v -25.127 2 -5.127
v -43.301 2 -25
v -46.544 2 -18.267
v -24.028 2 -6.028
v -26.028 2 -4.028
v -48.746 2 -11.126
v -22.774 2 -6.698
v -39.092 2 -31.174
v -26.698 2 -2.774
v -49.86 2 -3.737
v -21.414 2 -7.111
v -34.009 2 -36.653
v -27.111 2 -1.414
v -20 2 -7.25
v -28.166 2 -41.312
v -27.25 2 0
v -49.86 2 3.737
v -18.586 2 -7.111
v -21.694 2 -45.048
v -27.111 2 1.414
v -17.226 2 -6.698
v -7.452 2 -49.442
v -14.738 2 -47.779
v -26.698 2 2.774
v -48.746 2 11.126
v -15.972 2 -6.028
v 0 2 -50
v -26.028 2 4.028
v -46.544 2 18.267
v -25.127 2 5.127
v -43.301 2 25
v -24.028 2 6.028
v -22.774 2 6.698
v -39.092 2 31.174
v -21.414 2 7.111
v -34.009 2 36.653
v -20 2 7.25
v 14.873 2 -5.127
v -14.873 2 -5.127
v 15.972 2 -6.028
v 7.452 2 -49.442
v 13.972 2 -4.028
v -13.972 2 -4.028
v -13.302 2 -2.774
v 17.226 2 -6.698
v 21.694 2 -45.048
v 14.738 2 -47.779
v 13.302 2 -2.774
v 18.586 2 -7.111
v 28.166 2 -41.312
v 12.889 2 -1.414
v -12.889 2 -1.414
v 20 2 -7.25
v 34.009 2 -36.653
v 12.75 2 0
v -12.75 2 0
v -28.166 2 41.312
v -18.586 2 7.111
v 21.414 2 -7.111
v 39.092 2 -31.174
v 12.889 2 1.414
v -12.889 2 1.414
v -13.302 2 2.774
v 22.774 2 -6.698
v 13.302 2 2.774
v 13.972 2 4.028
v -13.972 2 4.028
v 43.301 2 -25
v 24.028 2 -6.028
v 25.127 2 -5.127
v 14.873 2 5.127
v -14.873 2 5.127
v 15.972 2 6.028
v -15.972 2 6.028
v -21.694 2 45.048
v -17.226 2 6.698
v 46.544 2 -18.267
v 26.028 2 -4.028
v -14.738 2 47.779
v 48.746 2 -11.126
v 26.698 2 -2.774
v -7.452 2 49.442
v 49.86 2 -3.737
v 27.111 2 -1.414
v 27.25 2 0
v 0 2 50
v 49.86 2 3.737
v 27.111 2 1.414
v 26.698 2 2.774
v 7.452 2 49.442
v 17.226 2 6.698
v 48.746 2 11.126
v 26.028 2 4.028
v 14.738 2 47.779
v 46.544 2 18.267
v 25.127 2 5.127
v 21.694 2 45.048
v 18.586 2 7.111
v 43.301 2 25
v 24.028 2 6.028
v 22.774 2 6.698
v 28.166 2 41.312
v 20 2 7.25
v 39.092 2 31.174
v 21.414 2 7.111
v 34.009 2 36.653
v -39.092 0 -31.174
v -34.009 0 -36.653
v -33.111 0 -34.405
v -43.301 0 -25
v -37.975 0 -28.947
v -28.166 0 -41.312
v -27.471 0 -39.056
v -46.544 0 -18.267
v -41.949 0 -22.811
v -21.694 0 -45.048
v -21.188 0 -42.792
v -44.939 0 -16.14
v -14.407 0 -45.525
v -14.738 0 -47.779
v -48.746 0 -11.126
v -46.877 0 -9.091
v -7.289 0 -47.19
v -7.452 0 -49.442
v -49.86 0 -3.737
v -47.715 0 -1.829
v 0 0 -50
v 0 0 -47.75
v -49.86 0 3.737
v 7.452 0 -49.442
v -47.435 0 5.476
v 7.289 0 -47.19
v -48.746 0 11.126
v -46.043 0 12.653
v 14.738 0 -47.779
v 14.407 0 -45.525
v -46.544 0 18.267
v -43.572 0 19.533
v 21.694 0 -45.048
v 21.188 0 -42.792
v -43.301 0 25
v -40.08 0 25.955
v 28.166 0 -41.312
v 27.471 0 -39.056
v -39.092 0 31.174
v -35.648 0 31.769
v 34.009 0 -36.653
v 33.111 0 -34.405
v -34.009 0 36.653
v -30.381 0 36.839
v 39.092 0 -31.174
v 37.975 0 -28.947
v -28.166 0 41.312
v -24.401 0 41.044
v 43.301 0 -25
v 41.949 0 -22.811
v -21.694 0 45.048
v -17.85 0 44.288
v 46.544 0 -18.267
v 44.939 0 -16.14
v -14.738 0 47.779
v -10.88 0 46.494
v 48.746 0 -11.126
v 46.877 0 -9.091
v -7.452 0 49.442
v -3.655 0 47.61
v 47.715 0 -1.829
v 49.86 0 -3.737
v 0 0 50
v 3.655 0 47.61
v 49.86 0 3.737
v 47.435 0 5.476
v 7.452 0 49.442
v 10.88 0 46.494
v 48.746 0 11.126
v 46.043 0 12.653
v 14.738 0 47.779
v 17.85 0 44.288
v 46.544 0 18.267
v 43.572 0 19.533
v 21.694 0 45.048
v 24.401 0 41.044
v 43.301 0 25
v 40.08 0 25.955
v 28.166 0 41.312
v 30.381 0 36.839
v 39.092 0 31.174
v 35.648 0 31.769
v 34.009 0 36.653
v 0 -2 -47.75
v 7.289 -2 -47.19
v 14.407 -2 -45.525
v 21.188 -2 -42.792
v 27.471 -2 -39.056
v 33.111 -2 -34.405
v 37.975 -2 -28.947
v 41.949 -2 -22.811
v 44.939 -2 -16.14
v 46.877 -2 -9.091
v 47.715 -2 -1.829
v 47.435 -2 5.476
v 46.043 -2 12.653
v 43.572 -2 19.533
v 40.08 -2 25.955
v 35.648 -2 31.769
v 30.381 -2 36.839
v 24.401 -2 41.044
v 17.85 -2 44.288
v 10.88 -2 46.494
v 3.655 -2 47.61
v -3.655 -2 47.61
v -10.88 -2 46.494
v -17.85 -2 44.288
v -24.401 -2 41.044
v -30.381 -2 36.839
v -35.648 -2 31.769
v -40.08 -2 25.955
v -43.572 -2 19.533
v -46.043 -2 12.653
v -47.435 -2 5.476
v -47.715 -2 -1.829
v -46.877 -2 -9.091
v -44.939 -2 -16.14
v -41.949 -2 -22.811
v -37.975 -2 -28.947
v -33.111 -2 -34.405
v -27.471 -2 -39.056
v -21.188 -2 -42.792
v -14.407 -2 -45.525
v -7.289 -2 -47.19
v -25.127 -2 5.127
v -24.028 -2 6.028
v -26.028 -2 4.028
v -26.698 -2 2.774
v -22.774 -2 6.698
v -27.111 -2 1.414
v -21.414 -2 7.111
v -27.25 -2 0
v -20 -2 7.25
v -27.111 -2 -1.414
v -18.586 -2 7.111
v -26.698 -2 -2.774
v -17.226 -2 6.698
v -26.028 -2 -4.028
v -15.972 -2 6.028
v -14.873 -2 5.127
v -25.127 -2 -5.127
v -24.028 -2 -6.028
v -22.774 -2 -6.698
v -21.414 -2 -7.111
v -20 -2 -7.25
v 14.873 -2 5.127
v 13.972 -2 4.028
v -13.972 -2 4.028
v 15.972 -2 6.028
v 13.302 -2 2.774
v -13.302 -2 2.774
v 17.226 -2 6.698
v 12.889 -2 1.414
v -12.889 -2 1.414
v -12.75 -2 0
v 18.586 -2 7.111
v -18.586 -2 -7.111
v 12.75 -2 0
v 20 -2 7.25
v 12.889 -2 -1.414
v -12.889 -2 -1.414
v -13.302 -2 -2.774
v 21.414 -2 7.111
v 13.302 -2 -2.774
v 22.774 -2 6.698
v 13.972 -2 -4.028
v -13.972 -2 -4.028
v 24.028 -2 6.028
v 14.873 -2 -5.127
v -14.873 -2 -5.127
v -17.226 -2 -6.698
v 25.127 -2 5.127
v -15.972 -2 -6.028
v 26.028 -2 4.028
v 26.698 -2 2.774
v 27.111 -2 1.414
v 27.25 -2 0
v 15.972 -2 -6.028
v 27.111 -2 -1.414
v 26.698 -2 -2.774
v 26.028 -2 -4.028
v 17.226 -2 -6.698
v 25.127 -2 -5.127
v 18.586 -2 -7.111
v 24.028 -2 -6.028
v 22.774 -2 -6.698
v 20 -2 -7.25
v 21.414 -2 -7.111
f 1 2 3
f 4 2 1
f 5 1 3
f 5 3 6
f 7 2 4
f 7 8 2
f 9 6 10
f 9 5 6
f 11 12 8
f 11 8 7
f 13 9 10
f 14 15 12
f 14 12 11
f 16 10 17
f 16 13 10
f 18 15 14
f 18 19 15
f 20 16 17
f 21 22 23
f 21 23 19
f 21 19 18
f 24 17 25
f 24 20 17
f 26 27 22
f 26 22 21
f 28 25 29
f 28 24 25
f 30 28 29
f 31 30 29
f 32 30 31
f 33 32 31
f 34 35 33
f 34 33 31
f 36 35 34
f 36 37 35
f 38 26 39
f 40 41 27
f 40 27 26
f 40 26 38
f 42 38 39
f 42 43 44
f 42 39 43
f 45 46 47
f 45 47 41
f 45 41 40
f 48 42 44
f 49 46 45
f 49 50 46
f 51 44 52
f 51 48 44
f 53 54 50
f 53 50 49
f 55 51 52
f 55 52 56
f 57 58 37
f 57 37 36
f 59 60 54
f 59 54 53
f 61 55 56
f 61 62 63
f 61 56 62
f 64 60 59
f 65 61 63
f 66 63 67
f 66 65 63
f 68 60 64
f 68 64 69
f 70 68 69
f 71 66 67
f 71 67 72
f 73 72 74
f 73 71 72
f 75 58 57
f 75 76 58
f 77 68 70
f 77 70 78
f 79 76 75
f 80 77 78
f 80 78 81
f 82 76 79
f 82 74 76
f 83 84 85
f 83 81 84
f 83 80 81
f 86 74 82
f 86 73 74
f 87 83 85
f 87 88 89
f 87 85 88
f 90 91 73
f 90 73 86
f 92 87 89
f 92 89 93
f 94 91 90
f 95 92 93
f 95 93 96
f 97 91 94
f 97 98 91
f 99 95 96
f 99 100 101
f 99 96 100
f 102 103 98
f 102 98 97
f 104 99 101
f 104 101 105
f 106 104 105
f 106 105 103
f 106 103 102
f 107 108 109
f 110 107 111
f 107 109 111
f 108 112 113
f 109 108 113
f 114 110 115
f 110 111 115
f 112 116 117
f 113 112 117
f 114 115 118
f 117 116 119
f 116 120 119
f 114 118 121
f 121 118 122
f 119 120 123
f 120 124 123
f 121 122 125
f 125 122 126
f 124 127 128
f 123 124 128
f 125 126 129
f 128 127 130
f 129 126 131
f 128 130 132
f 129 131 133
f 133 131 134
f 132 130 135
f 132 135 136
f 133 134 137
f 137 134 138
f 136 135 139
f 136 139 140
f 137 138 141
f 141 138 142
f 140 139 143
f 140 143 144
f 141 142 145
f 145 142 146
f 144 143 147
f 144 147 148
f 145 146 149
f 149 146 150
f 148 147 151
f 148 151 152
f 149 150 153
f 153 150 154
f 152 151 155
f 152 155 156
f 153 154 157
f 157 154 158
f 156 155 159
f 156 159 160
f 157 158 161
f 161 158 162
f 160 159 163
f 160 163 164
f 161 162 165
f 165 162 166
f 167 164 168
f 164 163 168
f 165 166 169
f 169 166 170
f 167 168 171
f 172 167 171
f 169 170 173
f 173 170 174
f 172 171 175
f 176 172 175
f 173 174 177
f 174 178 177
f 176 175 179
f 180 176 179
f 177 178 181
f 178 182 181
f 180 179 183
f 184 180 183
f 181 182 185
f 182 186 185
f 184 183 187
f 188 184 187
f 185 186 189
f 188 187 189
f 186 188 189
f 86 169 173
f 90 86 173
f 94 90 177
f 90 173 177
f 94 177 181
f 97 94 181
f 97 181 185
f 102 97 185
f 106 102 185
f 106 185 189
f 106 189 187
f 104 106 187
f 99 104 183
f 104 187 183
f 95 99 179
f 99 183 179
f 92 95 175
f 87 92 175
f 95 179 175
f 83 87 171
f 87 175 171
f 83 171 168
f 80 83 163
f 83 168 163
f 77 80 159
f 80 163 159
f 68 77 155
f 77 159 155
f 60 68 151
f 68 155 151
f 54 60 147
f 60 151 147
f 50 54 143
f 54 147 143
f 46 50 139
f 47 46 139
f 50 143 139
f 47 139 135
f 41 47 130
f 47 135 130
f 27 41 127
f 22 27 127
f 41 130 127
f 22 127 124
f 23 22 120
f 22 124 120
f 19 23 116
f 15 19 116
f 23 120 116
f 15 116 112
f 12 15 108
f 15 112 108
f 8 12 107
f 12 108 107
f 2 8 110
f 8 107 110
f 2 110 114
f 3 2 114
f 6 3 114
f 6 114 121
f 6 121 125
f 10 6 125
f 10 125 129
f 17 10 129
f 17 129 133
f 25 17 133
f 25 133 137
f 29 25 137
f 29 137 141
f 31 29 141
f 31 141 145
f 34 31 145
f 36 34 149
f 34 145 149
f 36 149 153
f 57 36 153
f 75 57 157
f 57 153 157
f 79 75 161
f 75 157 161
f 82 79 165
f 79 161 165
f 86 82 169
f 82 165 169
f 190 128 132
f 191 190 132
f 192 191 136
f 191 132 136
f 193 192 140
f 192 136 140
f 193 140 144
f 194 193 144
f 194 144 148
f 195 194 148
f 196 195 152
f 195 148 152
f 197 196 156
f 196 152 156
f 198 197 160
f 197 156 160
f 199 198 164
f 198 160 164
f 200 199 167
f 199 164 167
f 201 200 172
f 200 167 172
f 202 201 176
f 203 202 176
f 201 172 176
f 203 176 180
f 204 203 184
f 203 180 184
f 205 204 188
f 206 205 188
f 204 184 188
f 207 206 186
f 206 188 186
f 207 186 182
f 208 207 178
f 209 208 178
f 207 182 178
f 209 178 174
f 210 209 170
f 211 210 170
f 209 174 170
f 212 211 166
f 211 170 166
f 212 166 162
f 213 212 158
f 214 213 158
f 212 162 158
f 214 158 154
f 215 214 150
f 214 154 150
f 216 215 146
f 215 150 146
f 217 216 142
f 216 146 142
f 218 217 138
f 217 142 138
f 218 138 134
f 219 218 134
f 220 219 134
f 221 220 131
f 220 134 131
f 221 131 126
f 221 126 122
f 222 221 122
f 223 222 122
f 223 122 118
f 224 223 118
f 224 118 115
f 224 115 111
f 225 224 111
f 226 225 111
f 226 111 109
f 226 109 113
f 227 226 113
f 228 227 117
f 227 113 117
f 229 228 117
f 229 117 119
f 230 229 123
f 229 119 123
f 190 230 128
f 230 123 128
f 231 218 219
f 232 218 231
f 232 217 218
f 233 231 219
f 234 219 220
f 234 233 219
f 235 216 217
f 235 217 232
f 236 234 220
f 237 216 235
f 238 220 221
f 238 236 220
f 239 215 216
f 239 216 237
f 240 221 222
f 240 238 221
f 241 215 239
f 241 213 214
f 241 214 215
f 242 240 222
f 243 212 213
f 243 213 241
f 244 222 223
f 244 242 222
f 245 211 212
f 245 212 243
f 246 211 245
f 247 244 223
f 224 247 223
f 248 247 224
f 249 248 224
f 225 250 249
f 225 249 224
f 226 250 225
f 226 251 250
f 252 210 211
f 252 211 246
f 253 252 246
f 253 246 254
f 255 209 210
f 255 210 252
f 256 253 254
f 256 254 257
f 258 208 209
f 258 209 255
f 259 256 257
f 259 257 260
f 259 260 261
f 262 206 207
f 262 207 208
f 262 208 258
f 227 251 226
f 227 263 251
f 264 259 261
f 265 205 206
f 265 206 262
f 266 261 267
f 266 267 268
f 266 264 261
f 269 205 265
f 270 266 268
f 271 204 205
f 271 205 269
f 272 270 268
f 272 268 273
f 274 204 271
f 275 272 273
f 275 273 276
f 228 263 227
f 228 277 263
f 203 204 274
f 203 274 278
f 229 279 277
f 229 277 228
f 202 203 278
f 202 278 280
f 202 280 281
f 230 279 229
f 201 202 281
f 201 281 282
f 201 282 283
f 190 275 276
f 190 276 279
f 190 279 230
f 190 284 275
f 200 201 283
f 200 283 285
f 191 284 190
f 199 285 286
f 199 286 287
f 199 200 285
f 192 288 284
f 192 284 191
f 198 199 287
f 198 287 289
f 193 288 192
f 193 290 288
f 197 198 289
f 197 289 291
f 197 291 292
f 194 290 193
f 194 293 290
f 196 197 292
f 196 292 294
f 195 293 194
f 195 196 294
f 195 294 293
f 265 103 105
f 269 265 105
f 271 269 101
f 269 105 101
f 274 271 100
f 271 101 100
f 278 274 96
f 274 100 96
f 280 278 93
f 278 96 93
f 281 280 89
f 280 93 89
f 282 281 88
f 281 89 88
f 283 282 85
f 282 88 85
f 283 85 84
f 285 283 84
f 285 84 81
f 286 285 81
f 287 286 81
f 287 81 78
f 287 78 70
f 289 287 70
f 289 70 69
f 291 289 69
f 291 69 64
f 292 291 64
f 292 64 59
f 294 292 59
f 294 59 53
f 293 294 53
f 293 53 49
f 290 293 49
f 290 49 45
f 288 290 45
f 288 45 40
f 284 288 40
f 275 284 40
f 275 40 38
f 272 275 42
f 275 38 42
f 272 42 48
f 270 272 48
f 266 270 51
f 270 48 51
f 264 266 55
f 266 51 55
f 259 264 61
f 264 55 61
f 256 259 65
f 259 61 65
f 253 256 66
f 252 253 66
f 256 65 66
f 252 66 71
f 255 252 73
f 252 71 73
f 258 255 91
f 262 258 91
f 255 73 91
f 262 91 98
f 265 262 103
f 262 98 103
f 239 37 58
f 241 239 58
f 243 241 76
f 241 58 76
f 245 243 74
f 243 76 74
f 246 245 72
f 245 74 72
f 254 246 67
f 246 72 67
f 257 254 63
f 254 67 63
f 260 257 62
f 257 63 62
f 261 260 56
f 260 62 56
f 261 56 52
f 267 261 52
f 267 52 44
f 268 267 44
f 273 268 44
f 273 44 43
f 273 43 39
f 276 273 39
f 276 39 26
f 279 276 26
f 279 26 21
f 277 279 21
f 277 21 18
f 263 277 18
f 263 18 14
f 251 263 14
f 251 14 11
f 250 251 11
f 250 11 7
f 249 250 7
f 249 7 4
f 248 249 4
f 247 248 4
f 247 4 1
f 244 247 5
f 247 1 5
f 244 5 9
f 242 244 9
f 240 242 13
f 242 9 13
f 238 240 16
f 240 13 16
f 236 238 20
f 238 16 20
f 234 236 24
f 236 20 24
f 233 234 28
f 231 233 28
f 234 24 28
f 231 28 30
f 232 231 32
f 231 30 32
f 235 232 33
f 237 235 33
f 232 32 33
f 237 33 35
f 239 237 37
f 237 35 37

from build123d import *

# Parameters (mm, degrees)
SKETCH1_R           = 50
BOSS_EXTRUDE1_DEPTH = 2
SKETCH2_R           = 47.75
BOSS_EXTRUDE2_DEPTH = 2
SKETCH3_R           = 7.25
CUT_EXTRUDE1_DEPTH  = 71.823724839


with BuildPart() as part:
    # Sketch1 → Boss-Extrude1 (new body)
    with BuildSketch(Plane(origin=(0, 0, 0), x_dir=(1, 0, 0), z_dir=(0, 1, 0))):
        with Locations(Location((0, 0, 0), (0, 0, 270))):
            Circle(SKETCH1_R)
    extrude(amount=BOSS_EXTRUDE1_DEPTH)

    # Sketch2 → Boss-Extrude2 (add)
    with BuildSketch(Plane.XZ):
        with Locations(Location((0, 0, 0), (0, 0, 270))):
            Circle(SKETCH2_R)
    extrude(amount=BOSS_EXTRUDE2_DEPTH)

    # Sketch3 → Cut-Extrude1 (cut, through all)
    with BuildSketch(Plane(origin=(0, 2, 0), x_dir=(1, 0, 0), z_dir=(0, 1, 0))):
        with Locations(Location((-20, 0, 0), (0, 0, 270))):
            Circle(SKETCH3_R)
        with Locations(Location((20, 0, 0), (0, 0, 270))):
            Circle(SKETCH3_R)
    extrude(amount=-CUT_EXTRUDE1_DEPTH, mode=Mode.SUBTRACT)


solid = part.part
